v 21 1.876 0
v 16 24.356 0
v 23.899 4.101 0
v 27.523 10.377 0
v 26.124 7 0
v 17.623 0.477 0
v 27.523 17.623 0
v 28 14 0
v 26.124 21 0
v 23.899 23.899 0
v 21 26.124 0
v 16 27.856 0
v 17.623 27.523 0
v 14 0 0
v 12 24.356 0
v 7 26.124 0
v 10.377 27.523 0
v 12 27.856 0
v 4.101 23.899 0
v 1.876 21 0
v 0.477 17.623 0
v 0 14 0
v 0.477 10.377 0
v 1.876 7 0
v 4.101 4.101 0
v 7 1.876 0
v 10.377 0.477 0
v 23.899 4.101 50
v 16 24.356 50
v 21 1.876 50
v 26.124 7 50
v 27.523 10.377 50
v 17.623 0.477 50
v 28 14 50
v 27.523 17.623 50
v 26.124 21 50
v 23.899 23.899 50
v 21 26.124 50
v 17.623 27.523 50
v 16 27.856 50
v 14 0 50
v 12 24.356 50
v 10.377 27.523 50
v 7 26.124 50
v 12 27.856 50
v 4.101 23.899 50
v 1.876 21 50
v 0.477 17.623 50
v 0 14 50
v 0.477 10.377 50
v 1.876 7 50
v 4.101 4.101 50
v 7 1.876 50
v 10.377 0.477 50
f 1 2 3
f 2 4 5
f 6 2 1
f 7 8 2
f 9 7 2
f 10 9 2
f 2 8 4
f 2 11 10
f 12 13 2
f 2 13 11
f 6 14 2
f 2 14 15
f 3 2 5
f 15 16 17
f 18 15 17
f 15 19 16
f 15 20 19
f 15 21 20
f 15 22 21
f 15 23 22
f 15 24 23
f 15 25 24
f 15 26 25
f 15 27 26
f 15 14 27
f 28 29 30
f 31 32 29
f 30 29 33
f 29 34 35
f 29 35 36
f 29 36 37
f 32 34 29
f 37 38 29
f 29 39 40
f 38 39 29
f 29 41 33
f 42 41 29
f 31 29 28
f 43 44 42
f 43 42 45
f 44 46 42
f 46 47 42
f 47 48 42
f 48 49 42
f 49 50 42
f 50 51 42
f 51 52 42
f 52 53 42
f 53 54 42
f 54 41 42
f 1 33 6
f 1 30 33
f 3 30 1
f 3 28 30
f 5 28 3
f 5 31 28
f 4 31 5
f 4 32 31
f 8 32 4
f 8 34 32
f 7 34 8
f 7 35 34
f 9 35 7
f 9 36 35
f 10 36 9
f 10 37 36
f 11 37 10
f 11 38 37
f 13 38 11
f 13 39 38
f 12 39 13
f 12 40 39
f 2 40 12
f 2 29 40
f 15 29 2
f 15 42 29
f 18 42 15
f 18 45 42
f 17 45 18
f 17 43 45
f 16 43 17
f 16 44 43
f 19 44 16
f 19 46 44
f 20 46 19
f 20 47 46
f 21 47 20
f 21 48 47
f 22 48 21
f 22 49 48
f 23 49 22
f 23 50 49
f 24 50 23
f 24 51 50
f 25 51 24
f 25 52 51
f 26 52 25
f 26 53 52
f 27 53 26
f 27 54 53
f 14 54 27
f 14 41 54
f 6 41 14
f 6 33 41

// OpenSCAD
$fn = 32;

// ----------------------------------------------------------------------
// Keyway shaft: d28 shaft, key 4 x 3.5 mm
// ----------------------------------------------------------------------

// --- parameters (mm) ---
shaft_r = 14;             // shaft radius
key_w = 4;                // keyway width
key_d = 3.5;              // keyway depth below the surface line
plate_t = 50;             // shaft length, Z (extrusion height)

shaft_d = 2 * shaft_r;  // shaft diameter
circle_step = 15;  // polygon sampling step, degrees

profile = [[10.377, 27.523], [7, 26.124], [4.101, 23.899], [1.876, 21], [0.477, 17.623], [0, 14], [0.477, 10.377], [1.876, 7], [4.101, 4.101], [7, 1.876], [10.377, 0.477], [14, 0], [17.623, 0.477], [21, 1.876], [23.899, 4.101], [26.124, 7], [27.523, 10.377], [28, 14], [27.523, 17.623], [26.124, 21], [23.899, 23.899], [21, 26.124], [17.623, 27.523], [16, 27.856], [16, 24.356], [12, 24.356], [12, 27.856]];  // primary outline, 27 points, counter clockwise

// --- the one profile operation ---
linear_extrude(height = plate_t) polygon(points = profile);
